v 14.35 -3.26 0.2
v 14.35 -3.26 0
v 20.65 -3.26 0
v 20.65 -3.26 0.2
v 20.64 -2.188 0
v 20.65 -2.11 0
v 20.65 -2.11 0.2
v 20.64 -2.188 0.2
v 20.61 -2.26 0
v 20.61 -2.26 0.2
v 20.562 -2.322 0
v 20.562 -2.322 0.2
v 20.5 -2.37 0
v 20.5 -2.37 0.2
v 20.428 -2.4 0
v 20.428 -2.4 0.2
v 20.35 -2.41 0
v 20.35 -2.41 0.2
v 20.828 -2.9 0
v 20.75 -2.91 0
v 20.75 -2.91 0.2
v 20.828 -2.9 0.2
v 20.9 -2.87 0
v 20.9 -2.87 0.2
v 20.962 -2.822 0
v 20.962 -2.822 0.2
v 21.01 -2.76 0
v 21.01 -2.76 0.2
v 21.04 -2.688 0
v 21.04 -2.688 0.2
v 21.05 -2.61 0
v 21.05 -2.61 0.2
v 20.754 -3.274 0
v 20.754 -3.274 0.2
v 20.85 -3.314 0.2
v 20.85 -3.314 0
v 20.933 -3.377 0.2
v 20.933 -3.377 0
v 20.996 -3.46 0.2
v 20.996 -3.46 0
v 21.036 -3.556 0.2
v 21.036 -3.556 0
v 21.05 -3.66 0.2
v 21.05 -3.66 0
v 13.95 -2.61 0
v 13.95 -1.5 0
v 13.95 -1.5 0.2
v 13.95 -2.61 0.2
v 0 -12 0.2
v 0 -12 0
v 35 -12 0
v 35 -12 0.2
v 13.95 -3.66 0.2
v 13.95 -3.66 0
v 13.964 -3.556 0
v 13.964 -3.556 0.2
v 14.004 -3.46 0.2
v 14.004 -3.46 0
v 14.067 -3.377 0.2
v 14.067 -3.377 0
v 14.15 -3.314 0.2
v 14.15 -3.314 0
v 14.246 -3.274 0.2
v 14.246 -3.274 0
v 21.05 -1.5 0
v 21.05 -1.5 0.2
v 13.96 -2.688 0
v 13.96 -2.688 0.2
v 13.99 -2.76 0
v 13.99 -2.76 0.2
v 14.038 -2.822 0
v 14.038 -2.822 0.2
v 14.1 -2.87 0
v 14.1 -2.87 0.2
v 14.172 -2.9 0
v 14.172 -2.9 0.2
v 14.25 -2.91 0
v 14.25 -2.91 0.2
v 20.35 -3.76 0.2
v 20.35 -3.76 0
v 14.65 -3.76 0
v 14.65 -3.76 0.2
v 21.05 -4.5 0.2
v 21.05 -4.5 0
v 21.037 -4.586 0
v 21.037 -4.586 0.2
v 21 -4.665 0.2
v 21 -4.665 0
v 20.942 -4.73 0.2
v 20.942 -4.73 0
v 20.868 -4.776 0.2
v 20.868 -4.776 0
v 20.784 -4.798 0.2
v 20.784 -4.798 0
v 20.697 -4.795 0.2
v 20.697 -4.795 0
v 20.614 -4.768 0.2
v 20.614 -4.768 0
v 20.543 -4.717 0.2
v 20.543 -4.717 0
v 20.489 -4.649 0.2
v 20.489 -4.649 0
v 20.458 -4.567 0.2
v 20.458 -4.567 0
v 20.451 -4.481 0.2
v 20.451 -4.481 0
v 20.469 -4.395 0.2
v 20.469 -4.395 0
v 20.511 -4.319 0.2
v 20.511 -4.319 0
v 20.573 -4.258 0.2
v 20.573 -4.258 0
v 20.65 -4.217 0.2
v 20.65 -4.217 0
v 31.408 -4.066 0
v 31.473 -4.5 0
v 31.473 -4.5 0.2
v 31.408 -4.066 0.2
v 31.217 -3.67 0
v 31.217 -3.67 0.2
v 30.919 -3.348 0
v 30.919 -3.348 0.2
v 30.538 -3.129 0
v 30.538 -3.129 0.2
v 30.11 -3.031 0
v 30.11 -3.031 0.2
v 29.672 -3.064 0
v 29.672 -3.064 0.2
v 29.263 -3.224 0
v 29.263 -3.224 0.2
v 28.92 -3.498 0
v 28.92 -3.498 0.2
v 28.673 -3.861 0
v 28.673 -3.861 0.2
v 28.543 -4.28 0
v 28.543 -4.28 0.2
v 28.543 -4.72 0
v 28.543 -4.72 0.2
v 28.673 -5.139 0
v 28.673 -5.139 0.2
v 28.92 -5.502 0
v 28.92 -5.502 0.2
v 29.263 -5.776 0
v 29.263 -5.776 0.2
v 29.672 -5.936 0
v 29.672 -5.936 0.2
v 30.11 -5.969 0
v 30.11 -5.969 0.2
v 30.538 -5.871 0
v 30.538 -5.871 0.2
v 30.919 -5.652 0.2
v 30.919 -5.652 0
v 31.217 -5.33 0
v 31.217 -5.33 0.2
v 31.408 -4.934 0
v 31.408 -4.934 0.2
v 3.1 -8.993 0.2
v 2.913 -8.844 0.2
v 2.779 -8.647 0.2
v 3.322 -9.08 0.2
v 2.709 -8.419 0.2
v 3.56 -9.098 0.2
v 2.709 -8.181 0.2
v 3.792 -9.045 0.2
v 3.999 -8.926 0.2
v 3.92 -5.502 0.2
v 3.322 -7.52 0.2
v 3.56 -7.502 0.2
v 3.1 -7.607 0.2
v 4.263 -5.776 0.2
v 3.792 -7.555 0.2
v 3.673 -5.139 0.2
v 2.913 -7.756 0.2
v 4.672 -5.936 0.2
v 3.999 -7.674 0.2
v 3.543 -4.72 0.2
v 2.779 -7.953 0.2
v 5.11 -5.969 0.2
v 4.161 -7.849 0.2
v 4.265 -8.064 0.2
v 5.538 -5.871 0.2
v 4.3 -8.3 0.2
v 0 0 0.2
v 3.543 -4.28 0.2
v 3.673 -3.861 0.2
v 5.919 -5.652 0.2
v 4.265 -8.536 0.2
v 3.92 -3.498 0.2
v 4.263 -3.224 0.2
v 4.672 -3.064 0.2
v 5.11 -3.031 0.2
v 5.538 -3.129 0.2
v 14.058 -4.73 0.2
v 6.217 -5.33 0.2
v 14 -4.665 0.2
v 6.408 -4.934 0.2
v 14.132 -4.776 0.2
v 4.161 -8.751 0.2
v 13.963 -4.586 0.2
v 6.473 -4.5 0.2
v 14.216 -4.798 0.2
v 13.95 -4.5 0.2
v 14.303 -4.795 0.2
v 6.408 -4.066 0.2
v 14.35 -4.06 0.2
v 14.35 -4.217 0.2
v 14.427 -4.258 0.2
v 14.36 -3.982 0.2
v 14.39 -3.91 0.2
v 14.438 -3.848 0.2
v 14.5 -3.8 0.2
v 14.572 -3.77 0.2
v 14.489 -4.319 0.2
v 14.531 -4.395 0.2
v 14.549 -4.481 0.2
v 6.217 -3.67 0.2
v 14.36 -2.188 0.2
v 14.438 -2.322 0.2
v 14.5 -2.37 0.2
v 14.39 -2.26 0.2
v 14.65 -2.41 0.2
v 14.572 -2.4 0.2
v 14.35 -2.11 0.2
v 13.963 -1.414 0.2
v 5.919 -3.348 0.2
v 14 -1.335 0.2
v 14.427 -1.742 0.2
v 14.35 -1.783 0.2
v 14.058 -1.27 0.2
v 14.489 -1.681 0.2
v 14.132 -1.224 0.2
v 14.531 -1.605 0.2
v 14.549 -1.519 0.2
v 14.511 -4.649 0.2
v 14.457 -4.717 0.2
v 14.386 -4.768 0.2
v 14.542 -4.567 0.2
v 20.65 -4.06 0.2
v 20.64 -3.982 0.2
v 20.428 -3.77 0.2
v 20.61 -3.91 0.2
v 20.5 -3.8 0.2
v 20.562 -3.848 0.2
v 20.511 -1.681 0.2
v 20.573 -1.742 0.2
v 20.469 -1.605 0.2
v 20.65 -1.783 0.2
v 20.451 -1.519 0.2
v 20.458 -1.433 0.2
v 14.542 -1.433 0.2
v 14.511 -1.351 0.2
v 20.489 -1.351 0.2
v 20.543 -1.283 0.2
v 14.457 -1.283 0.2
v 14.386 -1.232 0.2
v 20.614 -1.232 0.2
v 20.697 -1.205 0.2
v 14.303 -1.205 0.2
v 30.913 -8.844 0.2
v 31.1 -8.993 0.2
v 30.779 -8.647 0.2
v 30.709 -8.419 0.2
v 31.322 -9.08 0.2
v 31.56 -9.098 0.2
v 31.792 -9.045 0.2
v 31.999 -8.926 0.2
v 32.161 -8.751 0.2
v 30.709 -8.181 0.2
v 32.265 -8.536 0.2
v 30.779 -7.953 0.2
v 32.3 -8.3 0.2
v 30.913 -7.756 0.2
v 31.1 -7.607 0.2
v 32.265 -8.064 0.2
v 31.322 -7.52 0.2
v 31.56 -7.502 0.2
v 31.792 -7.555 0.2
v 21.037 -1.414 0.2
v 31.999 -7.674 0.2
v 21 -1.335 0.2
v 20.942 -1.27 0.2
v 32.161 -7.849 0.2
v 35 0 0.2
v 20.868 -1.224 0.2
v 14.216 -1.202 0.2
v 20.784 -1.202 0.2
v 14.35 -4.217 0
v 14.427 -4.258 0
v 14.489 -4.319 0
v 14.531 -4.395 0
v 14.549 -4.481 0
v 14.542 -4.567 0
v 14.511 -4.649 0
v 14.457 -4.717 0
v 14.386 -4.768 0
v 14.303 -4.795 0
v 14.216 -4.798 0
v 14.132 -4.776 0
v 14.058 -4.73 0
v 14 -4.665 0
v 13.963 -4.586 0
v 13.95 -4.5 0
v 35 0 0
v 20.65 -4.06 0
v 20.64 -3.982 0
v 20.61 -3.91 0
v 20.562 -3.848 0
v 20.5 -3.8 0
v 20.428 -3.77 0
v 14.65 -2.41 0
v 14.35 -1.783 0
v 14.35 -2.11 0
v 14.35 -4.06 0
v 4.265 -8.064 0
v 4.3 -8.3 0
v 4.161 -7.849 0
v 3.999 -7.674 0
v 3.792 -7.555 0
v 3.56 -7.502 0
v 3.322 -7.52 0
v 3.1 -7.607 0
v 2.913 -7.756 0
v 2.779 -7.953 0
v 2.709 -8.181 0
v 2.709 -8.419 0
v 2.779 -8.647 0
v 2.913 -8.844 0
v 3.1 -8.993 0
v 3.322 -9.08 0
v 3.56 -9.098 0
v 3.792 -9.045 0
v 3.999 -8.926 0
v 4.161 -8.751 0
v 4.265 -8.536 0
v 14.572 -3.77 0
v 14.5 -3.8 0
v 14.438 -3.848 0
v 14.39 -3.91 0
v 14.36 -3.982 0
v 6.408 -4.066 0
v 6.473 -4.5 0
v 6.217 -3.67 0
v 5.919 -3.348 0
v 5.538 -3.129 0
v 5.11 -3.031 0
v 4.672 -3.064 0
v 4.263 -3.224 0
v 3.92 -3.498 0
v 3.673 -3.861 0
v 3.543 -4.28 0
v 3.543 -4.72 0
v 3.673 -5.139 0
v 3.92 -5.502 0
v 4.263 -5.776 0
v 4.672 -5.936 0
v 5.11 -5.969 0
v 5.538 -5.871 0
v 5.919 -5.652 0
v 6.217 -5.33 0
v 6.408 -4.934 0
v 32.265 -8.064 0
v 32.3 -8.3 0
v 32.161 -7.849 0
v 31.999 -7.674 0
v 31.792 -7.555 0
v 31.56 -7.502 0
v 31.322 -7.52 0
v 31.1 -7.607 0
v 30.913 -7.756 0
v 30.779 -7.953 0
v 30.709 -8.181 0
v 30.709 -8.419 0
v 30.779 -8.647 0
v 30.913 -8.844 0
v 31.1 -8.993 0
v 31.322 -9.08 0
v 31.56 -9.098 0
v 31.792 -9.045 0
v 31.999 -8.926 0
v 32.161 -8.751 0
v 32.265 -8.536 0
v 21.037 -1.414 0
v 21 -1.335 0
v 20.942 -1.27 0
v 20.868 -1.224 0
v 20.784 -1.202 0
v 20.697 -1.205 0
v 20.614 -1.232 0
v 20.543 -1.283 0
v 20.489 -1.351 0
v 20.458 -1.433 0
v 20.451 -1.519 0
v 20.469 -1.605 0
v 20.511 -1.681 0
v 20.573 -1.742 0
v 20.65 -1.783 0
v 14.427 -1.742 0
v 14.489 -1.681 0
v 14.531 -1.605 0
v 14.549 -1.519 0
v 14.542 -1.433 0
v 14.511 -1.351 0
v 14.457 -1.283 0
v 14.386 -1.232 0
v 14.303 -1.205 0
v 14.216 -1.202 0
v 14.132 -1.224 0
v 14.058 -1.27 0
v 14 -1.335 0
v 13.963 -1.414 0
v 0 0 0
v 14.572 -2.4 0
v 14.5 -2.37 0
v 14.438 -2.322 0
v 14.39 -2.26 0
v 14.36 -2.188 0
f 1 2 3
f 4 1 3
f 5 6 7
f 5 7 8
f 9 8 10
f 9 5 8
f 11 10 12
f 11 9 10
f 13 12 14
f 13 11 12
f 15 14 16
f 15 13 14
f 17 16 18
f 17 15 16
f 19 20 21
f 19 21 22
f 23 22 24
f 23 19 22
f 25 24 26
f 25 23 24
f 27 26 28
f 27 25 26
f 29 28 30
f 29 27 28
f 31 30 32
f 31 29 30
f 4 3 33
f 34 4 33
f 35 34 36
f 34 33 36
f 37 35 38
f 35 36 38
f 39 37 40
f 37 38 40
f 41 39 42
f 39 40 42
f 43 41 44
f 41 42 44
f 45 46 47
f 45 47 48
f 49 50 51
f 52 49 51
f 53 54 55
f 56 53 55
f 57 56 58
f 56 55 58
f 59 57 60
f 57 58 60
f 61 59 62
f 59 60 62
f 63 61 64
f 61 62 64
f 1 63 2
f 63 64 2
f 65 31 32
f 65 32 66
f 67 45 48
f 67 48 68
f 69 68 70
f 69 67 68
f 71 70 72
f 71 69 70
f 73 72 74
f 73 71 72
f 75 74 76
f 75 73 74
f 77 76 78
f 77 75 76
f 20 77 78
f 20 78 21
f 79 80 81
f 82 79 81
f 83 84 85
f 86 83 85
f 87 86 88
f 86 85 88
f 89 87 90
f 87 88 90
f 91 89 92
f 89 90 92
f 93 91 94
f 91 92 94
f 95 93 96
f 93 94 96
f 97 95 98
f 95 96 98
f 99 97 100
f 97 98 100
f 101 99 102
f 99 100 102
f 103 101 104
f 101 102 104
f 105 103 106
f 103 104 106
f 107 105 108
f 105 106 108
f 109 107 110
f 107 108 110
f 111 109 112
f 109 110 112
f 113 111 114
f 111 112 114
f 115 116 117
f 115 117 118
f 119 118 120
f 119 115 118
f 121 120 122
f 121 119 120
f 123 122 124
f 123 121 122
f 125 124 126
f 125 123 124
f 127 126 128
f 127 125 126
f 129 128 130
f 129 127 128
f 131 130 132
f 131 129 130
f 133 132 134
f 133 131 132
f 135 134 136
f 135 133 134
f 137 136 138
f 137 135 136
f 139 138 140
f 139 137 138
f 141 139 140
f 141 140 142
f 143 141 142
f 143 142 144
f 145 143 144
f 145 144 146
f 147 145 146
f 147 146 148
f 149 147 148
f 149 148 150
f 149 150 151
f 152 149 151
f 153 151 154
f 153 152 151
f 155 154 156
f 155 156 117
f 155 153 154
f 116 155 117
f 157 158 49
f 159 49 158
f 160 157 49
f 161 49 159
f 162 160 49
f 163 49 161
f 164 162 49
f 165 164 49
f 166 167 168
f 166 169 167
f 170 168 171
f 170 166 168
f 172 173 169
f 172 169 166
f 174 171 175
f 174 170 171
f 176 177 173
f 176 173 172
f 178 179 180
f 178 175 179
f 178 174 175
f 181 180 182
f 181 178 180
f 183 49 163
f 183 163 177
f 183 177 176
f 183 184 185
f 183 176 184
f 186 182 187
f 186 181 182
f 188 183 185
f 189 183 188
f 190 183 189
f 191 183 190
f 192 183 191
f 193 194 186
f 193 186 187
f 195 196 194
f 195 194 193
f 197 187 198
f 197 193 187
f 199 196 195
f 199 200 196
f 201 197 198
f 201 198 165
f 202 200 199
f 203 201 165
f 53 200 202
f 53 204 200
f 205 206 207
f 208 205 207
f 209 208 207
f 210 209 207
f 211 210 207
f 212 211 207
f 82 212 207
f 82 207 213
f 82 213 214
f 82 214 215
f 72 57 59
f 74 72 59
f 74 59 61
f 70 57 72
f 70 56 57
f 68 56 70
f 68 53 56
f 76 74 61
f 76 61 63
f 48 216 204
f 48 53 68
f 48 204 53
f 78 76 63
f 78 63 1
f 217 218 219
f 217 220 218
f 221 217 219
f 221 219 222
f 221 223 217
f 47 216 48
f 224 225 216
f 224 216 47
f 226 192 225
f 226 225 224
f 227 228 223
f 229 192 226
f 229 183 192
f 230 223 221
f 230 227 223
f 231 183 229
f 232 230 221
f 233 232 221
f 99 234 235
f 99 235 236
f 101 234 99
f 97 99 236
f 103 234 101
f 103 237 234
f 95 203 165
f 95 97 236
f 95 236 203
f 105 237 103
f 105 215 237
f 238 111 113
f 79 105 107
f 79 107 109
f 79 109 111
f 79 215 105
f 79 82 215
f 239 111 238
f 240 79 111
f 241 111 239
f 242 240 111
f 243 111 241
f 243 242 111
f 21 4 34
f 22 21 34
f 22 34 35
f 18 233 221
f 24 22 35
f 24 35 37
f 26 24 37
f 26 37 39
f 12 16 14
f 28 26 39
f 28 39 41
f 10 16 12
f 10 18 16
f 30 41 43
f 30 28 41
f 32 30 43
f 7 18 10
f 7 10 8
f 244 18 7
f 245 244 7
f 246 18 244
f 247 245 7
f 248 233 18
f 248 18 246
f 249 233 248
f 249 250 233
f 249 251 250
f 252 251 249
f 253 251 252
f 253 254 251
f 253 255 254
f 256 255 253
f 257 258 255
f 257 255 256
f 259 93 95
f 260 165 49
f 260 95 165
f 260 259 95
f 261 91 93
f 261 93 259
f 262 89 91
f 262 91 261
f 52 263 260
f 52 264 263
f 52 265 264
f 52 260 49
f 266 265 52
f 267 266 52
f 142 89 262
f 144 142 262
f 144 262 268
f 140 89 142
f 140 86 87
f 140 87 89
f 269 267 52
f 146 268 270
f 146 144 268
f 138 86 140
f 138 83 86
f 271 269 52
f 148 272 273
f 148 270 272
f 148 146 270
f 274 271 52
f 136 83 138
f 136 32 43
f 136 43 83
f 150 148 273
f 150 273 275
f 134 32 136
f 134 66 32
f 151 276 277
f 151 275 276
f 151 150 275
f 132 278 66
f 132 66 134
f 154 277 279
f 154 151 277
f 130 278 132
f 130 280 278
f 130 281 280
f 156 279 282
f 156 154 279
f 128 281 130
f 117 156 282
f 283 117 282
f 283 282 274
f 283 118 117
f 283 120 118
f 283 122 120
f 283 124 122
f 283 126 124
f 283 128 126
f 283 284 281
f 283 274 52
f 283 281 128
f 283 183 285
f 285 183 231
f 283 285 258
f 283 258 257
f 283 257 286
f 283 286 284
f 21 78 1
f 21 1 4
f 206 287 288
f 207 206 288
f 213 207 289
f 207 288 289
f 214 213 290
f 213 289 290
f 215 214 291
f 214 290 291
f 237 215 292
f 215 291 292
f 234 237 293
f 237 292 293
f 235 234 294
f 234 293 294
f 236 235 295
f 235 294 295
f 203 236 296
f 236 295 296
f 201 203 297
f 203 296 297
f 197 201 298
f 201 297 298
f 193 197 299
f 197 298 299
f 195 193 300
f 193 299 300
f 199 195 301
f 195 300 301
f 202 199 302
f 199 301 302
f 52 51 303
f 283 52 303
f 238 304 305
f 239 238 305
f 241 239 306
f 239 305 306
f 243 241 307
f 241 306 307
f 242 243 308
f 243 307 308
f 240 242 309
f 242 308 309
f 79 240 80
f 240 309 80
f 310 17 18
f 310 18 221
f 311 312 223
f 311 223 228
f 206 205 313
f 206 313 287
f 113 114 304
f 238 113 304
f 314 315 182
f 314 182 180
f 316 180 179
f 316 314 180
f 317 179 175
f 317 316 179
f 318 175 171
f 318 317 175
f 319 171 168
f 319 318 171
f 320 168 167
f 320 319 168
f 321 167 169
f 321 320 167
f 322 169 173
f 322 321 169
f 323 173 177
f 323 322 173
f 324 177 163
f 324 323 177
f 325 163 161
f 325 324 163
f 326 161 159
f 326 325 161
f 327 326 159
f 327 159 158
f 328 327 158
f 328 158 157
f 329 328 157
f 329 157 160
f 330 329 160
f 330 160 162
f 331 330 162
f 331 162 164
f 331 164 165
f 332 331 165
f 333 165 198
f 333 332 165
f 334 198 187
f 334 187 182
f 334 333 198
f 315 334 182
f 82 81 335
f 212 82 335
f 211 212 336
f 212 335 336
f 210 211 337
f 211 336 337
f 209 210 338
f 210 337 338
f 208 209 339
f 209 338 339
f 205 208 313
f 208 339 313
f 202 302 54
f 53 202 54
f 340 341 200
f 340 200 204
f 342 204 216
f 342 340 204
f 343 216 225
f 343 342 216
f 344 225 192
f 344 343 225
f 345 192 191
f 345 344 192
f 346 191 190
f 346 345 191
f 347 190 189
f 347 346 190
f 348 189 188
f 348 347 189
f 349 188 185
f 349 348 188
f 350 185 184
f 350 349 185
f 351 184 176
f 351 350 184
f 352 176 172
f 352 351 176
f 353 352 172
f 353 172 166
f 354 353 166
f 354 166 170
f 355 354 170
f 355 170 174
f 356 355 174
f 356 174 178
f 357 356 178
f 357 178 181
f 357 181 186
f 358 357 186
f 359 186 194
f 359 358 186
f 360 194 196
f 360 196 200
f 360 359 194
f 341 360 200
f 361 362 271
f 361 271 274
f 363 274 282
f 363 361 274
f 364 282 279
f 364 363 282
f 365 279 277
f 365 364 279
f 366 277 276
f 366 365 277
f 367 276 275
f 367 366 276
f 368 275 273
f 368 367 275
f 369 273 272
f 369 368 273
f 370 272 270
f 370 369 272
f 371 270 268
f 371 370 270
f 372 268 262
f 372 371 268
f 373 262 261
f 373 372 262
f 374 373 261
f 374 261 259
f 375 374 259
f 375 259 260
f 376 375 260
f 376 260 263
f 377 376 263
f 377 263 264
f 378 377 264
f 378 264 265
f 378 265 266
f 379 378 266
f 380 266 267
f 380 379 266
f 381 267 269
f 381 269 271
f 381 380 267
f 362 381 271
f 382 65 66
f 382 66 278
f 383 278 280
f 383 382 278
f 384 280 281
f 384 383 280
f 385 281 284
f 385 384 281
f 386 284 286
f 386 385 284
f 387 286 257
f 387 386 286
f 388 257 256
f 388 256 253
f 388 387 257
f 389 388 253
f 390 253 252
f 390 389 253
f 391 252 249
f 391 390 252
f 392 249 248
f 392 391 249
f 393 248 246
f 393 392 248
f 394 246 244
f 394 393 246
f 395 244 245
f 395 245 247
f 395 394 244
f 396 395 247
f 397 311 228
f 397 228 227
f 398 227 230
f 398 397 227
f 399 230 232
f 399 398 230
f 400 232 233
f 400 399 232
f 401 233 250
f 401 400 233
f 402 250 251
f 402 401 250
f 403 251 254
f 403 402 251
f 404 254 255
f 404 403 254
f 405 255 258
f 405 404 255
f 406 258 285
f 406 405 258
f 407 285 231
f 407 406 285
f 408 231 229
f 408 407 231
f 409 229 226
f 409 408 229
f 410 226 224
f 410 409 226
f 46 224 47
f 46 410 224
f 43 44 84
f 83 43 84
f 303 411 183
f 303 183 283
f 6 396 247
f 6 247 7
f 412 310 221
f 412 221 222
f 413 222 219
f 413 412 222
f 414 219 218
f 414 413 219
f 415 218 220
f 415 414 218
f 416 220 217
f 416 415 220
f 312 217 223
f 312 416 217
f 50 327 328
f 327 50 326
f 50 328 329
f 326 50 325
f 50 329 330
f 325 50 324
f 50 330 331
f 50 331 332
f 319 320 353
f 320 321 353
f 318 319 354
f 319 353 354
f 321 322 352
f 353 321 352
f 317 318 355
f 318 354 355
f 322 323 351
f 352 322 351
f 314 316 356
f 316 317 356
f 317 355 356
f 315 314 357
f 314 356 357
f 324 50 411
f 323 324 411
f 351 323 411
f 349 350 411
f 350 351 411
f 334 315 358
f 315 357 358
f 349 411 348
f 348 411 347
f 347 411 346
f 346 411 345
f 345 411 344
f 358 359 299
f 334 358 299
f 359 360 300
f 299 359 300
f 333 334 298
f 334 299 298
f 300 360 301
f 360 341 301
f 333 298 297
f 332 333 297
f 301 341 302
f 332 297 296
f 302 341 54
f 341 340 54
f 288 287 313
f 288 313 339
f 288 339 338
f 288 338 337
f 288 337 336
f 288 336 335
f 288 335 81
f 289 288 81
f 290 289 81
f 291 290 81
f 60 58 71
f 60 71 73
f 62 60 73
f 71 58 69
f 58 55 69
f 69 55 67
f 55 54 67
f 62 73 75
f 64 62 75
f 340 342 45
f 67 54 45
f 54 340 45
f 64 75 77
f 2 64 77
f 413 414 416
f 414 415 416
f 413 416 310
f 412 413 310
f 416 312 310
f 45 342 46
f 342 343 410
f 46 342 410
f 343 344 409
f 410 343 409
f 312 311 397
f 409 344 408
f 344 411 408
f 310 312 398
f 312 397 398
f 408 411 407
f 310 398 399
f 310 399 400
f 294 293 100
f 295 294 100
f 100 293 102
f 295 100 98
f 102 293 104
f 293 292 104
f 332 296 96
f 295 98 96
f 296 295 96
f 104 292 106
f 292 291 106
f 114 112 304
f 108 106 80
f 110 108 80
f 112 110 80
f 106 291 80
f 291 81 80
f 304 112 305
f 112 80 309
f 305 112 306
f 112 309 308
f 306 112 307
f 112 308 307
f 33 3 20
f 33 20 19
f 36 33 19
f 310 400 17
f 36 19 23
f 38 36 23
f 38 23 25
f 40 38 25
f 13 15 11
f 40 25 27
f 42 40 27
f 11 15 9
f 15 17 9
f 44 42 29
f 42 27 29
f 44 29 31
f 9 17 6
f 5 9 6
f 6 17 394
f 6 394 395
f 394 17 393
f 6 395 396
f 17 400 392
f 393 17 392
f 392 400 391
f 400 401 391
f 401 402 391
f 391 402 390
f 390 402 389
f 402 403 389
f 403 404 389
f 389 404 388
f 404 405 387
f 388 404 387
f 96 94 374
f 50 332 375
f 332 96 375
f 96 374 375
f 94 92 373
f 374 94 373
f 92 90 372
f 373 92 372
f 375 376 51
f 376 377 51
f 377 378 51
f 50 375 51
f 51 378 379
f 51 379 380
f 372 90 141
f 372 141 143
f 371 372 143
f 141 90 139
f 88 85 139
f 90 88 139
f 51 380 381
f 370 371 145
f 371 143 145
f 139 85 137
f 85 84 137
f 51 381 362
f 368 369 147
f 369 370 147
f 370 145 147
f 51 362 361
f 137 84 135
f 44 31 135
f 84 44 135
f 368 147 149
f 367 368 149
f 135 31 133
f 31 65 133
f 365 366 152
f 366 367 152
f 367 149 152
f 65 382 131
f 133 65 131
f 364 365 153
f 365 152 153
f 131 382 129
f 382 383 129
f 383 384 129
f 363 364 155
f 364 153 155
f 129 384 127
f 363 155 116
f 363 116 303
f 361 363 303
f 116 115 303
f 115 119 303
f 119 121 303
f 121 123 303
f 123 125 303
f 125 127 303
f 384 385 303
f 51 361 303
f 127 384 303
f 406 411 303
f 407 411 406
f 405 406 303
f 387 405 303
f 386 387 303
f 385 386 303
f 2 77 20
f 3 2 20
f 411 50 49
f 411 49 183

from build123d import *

# Parameters (mm, degrees)
SKETCH1_W           = 35
SKETCH1_H           = 12
SKETCH1_R           = 0.8001
SKETCH1_R_2         = 1.4732
BOSS_EXTRUDE1_DEPTH = 0.2


with BuildPart() as part:
    # Sketch1 → Boss-Extrude1 (new body)
    with BuildSketch(Plane.XY):
        with Locations((17.5, -6)):
            Rectangle(SKETCH1_W, SKETCH1_H)
        with Locations((3.5, -8.3)):
            Circle(SKETCH1_R, mode=Mode.SUBTRACT)
        with Locations((5, -4.5)):
            Circle(SKETCH1_R_2, mode=Mode.SUBTRACT)
        with Locations((30, -4.5)):
            Circle(SKETCH1_R_2, mode=Mode.SUBTRACT)
        with Locations((31.5, -8.3)):
            Circle(SKETCH1_R, mode=Mode.SUBTRACT)
        with BuildLine():
            Line((13.95, -4.5), (13.95, -3.66))
            ThreePointArc((13.95, -3.66), (14.067157288, -3.377157288), (14.35, -3.26))
            Line((14.35, -3.26), (20.65, -3.26))
            ThreePointArc((20.65, -3.26), (20.932842712, -3.377157288), (21.05, -3.66))
            Line((21.05, -3.66), (21.05, -4.5))
            ThreePointArc((21.05, -4.5), (20.576794919, -4.744948974), (20.65, -4.217157288))
            Line((20.65, -4.217157288), (20.65, -4.06))
            ThreePointArc((20.65, -4.06), (20.562132034, -3.847867966), (20.35, -3.76))
            Line((20.35, -3.76), (14.65, -3.76))
            ThreePointArc((14.65, -3.76), (14.437867966, -3.847867966), (14.35, -4.06))
            Line((14.35, -4.06), (14.35, -4.217157288))
            ThreePointArc((14.35, -4.217157288), (14.423205081, -4.744948974), (13.95, -4.5))
        make_face(mode=Mode.SUBTRACT)
        with BuildLine():
            Line((14.35, -2.11), (14.35, -1.782842712))
            ThreePointArc((14.35, -1.782842712), (14.423205081, -1.255051026), (13.95, -1.5))
            Line((13.95, -1.5), (13.95, -2.61))
            ThreePointArc((13.95, -2.61), (14.037867966, -2.822132034), (14.25, -2.91))
            Line((14.25, -2.91), (20.75, -2.91))
            ThreePointArc((20.75, -2.91), (20.962132034, -2.822132034), (21.05, -2.61))
            Line((21.05, -2.61), (21.05, -1.5))
            ThreePointArc((21.05, -1.5), (20.576794919, -1.255051026), (20.65, -1.782842712))
            Line((20.65, -1.782842712), (20.65, -2.11))
            ThreePointArc((20.65, -2.11), (20.562132034, -2.322132034), (20.35, -2.41))
            Line((20.35, -2.41), (14.65, -2.41))
            ThreePointArc((14.65, -2.41), (14.437867966, -2.322132034), (14.35, -2.11))
        make_face(mode=Mode.SUBTRACT)
    extrude(amount=BOSS_EXTRUDE1_DEPTH)


solid = part.part
